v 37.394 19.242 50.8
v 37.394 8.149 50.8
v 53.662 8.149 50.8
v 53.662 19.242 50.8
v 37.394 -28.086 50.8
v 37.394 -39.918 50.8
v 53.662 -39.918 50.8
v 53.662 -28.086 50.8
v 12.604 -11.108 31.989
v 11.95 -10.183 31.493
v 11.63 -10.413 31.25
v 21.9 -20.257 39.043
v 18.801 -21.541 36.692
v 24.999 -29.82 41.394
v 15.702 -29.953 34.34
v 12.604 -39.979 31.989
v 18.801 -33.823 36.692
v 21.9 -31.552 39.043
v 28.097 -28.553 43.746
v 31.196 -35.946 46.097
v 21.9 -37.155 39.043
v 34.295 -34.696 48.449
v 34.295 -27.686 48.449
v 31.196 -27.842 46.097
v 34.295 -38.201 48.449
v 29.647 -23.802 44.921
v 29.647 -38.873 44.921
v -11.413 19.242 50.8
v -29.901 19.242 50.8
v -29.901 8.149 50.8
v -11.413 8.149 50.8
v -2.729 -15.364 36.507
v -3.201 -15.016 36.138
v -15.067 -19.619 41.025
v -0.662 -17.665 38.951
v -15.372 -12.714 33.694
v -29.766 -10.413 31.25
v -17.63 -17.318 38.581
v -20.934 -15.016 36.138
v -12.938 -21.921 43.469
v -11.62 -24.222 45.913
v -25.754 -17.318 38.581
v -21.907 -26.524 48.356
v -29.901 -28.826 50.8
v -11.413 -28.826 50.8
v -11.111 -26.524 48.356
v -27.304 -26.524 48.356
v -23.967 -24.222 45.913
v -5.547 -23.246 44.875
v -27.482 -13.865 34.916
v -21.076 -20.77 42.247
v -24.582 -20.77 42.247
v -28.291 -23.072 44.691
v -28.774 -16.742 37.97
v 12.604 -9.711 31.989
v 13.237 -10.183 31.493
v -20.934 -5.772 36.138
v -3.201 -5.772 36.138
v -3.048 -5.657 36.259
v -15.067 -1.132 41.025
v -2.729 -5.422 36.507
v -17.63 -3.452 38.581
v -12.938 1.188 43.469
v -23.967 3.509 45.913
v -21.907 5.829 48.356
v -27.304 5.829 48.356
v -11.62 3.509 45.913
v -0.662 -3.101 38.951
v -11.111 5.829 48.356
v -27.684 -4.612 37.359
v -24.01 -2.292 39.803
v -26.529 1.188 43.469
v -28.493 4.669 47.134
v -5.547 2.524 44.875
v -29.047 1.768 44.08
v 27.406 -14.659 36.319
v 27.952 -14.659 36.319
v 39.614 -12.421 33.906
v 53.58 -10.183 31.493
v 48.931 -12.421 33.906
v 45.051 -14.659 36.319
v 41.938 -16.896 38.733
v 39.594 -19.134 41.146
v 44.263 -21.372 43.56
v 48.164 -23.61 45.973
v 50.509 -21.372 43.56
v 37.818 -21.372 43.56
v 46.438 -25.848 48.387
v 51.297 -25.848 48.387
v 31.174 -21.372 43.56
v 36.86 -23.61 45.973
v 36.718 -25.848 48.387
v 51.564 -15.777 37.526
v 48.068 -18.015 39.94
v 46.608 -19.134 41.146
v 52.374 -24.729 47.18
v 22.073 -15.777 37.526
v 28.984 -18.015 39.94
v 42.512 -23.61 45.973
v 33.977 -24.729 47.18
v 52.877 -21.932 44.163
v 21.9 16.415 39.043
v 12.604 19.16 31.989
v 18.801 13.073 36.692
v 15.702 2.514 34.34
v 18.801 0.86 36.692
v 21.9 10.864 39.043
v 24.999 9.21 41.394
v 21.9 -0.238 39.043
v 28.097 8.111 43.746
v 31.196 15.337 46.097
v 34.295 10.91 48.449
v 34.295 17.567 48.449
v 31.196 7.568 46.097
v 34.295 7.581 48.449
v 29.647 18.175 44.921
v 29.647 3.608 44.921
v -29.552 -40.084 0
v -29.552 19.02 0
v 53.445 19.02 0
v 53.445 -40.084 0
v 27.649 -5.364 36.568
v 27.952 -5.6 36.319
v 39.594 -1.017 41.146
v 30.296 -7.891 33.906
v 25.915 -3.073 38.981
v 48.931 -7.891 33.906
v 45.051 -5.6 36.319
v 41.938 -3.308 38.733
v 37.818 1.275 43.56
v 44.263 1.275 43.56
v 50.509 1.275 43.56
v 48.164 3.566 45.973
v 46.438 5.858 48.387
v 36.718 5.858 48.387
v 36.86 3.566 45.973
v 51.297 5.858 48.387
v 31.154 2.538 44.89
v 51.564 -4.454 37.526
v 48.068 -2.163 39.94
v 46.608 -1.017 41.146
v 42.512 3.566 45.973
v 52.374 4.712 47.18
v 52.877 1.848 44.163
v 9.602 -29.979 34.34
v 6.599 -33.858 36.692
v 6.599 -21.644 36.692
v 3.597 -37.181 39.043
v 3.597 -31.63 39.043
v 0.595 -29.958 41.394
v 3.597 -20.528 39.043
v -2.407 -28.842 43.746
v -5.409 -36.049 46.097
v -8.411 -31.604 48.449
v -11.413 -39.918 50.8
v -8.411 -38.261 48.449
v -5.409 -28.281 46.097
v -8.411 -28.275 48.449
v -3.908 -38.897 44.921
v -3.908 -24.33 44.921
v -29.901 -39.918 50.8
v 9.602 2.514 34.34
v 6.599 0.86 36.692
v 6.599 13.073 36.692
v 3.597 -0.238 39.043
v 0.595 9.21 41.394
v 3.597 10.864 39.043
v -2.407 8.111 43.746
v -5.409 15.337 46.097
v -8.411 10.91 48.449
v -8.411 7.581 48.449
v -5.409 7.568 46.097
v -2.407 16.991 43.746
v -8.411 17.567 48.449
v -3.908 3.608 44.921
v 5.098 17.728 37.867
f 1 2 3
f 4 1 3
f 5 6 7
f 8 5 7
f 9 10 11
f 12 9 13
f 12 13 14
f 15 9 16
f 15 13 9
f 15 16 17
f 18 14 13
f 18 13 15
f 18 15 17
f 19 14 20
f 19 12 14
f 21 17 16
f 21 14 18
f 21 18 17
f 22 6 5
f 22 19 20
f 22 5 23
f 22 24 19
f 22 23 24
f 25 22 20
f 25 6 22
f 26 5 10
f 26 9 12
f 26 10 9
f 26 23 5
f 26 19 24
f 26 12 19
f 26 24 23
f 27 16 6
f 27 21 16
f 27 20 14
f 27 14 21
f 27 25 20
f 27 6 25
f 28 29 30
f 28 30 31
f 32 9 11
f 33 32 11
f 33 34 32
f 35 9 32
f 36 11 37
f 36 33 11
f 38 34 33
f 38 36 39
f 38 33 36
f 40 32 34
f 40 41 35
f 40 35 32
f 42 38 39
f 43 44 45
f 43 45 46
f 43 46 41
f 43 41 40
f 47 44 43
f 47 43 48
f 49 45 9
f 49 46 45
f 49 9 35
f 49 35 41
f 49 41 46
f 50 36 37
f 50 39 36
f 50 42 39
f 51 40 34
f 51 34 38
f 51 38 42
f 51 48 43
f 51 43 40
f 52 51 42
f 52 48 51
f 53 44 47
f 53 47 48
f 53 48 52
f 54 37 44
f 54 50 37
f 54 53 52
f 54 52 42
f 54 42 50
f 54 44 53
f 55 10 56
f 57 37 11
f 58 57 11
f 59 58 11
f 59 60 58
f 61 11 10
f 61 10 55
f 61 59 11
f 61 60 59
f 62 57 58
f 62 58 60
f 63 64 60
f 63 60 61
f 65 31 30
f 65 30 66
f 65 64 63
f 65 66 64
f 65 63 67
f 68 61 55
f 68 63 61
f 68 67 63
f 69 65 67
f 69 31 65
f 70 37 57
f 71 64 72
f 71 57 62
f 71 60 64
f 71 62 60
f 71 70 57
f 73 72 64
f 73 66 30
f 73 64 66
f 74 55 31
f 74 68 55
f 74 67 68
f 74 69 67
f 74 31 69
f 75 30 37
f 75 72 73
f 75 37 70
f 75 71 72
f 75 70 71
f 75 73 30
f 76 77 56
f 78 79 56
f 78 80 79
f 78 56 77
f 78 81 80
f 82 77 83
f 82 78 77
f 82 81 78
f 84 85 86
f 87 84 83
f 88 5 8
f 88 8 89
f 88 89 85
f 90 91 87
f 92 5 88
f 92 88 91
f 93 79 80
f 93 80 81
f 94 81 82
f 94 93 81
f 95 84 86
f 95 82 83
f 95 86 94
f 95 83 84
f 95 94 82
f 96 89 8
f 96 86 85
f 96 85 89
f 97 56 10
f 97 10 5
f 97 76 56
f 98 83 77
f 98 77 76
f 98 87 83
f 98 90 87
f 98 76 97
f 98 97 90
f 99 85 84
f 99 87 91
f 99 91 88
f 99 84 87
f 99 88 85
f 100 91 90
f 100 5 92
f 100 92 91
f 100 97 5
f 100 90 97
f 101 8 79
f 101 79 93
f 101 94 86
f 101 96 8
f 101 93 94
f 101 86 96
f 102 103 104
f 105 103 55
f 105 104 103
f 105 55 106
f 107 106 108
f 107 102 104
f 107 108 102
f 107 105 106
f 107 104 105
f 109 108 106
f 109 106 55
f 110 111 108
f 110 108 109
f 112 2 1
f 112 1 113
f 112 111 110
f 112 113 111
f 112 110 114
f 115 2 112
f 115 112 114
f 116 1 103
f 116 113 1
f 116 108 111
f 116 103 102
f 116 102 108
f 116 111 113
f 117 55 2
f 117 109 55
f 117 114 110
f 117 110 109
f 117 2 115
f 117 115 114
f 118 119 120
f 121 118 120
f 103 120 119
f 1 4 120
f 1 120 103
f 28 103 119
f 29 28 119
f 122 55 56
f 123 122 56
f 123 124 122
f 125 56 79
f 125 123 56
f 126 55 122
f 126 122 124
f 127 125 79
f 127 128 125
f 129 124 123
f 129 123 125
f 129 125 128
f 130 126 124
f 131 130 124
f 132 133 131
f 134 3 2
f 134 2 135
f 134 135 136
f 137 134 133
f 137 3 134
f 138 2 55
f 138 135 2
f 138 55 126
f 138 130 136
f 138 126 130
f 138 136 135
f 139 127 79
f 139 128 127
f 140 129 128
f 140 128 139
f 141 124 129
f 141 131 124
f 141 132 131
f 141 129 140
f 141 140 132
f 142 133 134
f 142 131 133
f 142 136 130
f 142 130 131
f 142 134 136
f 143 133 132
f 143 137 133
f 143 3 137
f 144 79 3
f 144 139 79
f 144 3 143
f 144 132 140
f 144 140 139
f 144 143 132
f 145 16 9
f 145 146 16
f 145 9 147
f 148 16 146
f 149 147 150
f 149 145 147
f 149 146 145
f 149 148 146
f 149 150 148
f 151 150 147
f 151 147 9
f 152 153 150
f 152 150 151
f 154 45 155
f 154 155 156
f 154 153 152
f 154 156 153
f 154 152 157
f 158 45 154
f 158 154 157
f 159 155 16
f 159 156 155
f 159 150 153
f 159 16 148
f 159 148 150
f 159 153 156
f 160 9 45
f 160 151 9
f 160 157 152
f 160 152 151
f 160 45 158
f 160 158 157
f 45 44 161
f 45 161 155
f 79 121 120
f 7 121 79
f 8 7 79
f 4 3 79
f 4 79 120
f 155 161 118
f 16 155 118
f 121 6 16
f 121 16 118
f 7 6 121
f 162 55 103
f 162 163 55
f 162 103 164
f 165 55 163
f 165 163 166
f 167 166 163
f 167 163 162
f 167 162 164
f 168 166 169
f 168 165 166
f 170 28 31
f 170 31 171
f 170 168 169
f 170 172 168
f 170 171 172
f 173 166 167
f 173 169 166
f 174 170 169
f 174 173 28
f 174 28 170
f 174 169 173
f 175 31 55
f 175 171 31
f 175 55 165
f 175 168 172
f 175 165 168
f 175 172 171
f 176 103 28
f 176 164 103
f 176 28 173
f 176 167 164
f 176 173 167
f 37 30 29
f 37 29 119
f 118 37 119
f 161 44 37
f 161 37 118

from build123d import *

# Parameters (mm, degrees)
F0_W   = 82.996623
F0_H   = 59.103658
F2_W   = 18.487399
F2_H   = 11.092441
F2_W_2 = 16.268921
F2_H_2 = 11.831935
F2_H_3 = 11.092439


with BuildPart() as f3:
    # F0 (on Top) → F3 section 0
    with BuildSketch(Plane.XY):
        with Locations((11.946483, -10.531769)):
            Rectangle(F0_W, F0_H)
    # F2 (on offset) → F3 section 1
    with BuildSketch(Plane.XY.offset(50.8)):
        with Locations((-20.656906, 13.695306)):
            Rectangle(F2_W, F2_H)
    loft()

    # F0 (on Top) → F4 section 0
    with BuildSketch(Plane.XY):
        with Locations((11.946483, -10.531769)):
            Rectangle(F0_W, F0_H)
    # F2 (on offset) → F4 section 1
    with BuildSketch(Plane.XY.offset(50.8)):
        with Locations((45.527997, -34.00219)):
            Rectangle(F2_W_2, F2_H_2)
    loft()

    # F0 (on Top) → F5 section 0
    with BuildSketch(Plane.XY):
        with Locations((11.946483, -10.531769)):
            Rectangle(F0_W, F0_H)
    # F2 (on offset) → F5 section 1
    with BuildSketch(Plane.XY.offset(50.8)):
        with Locations((-20.656906, -34.371938)):
            Rectangle(F2_W, F2_H_3)
    loft()

    # F0 (on Top) → F6 section 0
    with BuildSketch(Plane.XY):
        with Locations((11.946483, -10.531769)):
            Rectangle(F0_W, F0_H)
    # F2 (on offset) → F6 section 1
    with BuildSketch(Plane.XY.offset(50.8)):
        with Locations((45.527997, 13.695306)):
            Rectangle(F2_W_2, F2_H)
    loft()


solid = f3.part
